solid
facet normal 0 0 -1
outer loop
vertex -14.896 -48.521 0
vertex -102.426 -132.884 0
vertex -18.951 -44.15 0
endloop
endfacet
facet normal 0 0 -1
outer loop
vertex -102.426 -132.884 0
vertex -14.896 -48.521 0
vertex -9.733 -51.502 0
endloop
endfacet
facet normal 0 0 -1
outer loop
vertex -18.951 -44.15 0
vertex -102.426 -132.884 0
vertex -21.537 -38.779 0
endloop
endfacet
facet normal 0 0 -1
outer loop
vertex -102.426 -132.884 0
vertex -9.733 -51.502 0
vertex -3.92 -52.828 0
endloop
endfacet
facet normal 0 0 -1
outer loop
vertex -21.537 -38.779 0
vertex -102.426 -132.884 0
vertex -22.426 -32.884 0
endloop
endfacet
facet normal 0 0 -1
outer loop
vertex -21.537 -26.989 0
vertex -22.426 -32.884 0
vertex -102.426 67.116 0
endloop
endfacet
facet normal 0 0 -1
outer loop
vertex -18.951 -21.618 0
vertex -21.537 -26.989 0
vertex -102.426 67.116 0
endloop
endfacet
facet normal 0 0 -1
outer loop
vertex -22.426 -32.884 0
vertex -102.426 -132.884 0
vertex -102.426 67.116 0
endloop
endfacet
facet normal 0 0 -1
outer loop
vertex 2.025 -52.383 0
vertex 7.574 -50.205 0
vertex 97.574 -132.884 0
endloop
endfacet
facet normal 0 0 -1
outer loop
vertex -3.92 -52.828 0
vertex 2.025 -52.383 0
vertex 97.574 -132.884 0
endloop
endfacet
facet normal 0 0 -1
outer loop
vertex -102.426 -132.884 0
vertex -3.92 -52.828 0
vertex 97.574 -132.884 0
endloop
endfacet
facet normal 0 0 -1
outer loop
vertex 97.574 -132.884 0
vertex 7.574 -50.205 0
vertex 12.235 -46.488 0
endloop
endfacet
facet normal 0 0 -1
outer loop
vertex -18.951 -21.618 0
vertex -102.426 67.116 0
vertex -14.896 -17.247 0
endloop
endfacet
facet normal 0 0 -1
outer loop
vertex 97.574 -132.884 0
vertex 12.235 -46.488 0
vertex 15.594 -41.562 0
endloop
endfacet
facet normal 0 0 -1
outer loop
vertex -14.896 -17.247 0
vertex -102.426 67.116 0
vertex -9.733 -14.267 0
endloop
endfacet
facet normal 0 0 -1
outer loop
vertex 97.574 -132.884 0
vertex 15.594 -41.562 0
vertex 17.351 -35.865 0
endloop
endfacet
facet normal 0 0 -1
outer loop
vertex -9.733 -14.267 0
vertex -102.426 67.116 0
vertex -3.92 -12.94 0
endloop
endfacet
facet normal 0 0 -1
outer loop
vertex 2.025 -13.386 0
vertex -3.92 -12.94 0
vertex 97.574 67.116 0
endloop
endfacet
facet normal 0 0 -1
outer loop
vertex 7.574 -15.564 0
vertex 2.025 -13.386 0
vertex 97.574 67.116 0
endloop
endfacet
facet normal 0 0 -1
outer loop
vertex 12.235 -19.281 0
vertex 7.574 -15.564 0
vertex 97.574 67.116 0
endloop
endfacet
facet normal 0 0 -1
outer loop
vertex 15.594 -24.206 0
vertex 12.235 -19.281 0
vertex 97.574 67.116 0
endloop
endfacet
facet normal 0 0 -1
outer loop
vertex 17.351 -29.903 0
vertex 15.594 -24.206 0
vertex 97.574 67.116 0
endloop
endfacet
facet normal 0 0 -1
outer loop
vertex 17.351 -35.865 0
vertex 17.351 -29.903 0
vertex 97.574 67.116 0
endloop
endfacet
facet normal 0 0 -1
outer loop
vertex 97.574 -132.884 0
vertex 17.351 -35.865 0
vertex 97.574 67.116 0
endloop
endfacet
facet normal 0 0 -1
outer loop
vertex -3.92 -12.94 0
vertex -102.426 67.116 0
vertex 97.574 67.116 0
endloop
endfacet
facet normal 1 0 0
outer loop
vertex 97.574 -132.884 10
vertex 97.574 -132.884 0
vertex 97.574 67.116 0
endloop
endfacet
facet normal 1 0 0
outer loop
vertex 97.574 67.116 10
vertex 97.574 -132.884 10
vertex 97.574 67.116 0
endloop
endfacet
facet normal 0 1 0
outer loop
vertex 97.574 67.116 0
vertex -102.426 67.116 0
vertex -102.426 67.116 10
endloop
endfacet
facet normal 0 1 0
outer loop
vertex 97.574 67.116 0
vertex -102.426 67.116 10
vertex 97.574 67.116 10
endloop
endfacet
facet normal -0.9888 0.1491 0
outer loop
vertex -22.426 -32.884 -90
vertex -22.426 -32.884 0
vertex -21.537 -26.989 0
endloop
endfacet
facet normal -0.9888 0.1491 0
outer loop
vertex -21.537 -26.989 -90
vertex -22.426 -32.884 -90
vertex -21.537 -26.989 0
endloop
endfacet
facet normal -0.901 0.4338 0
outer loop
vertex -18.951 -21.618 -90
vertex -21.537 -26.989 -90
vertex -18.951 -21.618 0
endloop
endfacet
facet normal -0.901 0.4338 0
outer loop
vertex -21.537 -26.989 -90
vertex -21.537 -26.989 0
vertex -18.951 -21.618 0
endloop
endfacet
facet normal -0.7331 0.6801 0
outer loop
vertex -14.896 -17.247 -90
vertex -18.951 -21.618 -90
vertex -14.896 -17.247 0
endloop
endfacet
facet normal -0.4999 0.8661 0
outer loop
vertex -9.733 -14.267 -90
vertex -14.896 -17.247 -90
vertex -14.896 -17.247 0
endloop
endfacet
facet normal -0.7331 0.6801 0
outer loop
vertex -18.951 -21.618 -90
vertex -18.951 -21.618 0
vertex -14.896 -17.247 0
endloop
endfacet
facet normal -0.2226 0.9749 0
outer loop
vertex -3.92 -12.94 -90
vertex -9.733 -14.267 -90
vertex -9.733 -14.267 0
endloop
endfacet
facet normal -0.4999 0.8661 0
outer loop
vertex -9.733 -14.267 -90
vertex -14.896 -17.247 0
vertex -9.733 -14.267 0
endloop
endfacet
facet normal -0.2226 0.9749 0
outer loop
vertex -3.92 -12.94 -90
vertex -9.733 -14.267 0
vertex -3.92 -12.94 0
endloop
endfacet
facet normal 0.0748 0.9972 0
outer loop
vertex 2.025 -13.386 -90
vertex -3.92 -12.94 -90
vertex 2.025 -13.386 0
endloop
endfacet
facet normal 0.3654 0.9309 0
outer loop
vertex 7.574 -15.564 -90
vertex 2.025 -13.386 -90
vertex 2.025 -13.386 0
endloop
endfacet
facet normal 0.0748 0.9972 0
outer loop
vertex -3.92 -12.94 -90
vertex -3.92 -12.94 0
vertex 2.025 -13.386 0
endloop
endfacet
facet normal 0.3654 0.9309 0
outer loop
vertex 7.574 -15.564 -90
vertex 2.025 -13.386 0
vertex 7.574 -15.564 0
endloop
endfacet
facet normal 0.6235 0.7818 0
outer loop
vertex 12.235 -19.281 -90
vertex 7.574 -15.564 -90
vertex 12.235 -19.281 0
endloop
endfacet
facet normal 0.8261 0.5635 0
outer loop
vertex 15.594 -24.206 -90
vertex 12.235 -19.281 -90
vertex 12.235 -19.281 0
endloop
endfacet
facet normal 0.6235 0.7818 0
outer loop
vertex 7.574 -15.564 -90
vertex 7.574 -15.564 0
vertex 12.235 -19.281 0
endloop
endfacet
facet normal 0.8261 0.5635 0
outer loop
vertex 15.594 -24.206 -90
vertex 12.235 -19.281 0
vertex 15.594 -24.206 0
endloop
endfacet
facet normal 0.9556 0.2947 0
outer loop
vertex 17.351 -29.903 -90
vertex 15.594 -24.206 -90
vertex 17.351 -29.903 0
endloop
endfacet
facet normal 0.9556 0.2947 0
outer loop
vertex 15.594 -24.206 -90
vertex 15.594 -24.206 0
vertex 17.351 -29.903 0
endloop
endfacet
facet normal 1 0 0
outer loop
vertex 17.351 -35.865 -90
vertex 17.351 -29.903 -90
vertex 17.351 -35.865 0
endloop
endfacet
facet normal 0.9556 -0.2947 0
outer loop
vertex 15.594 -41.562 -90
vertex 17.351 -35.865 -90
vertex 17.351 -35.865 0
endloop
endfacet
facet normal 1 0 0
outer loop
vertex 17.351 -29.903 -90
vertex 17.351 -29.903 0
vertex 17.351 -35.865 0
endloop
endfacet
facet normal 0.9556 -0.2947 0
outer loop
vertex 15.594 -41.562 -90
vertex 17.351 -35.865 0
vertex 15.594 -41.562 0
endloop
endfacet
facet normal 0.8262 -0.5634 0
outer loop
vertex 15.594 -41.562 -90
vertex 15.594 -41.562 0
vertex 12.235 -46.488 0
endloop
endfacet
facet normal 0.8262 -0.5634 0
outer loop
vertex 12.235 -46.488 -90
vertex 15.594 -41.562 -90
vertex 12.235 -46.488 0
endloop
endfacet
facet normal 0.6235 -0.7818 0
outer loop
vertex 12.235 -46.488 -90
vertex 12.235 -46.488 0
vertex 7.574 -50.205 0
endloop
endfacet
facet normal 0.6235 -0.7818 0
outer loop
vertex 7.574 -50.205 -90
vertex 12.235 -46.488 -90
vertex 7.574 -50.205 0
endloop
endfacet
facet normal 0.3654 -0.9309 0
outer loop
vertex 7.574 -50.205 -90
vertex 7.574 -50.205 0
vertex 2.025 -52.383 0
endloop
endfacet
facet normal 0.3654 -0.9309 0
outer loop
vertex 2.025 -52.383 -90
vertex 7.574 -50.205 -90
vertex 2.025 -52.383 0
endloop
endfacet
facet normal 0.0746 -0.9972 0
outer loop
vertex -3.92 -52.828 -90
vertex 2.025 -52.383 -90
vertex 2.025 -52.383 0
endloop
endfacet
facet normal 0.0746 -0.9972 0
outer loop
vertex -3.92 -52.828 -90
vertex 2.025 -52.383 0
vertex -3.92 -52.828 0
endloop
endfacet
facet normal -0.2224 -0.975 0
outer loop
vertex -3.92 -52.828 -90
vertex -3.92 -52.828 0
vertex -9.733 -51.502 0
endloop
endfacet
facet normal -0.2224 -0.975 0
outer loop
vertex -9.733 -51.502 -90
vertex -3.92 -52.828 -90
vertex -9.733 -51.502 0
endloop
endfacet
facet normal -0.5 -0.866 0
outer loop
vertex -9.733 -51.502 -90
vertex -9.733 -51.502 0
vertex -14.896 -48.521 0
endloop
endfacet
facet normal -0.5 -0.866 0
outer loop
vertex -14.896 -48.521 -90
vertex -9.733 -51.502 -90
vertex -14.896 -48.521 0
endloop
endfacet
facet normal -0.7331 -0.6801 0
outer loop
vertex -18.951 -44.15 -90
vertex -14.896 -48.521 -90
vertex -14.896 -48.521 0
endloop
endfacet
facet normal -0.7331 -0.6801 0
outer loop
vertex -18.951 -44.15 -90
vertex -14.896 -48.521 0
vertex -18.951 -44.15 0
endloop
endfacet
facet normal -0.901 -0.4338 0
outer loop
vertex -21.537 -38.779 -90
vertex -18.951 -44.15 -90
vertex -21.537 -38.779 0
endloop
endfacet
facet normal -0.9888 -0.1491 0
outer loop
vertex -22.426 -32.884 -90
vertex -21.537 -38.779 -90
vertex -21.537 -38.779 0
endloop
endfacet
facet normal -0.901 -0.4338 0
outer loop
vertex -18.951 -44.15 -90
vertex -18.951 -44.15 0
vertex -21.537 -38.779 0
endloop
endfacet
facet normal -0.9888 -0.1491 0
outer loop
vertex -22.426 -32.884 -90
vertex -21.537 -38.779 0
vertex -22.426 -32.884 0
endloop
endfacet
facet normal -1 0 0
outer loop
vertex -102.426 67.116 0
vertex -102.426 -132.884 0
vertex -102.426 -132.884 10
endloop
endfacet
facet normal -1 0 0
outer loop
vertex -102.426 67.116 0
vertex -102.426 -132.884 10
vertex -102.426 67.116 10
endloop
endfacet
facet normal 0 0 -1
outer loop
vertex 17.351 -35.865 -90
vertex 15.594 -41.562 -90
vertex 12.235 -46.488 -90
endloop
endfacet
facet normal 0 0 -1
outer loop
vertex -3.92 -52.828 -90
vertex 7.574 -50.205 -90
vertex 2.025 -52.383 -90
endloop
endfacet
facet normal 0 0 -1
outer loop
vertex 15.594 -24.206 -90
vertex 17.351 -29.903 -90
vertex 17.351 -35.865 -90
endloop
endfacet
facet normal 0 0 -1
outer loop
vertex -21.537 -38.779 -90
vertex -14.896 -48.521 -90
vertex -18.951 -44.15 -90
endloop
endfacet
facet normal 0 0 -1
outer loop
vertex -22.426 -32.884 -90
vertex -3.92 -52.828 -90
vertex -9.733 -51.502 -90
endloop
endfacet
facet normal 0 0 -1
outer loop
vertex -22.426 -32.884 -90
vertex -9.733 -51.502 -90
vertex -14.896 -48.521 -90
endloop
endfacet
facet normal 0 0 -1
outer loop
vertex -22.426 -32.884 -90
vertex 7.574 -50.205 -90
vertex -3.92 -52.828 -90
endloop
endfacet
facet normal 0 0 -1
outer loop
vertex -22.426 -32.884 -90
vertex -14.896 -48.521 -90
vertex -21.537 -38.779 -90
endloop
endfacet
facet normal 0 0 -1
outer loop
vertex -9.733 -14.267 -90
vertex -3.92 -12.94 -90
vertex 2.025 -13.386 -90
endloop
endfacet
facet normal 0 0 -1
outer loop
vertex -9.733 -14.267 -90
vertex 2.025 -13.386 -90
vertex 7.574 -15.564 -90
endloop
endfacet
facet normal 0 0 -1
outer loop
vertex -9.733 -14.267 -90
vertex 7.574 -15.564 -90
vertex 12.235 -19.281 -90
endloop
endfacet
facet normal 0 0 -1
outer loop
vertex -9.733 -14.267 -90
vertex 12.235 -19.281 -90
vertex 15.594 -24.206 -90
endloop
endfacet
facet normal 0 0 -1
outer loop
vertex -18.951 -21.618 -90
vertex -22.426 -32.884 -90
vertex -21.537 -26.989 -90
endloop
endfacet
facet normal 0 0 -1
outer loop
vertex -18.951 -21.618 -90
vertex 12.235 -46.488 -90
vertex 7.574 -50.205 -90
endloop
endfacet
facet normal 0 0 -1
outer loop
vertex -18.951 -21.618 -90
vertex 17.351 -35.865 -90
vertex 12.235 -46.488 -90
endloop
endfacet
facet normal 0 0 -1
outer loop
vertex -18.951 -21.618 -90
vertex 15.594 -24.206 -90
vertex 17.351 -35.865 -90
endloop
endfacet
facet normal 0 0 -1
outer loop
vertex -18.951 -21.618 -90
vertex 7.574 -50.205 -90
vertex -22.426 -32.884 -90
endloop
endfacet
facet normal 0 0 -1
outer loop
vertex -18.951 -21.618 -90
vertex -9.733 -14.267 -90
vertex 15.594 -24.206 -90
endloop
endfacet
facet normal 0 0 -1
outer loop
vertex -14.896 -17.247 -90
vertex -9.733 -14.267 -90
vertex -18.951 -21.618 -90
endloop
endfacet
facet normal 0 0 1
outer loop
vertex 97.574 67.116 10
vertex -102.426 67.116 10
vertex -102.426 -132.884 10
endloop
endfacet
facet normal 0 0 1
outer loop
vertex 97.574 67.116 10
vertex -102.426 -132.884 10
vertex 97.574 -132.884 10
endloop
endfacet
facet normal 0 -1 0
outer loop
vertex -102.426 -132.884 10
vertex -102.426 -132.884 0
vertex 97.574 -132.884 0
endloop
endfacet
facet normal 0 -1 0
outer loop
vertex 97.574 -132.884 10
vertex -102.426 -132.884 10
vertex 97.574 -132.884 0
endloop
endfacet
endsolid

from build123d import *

# Parameters (mm, degrees)
SKETCH1_W           = 200
SKETCH1_H           = 200
BOSS_EXTRUDE1_DEPTH = 10
SKETCH2_R           = 20
BOSS_EXTRUDE2_DEPTH = 90


with BuildPart() as part:
    # Sketch1 → Boss-Extrude1 (new body)
    with BuildSketch(Plane.XY):
        with Locations((-2.425876011, -32.884097035)):
            Rectangle(SKETCH1_W, SKETCH1_H)
    extrude(amount=BOSS_EXTRUDE1_DEPTH)

    # Sketch2 → Boss-Extrude2 (add)
    with BuildSketch(Plane(origin=(0, 0, 0), x_dir=(-1, 0, 0), z_dir=(0, 0, -1))):
        with Locations((2.425876011, -32.884097035)):
            Circle(SKETCH2_R)
    extrude(amount=BOSS_EXTRUDE2_DEPTH)


solid = part.part
